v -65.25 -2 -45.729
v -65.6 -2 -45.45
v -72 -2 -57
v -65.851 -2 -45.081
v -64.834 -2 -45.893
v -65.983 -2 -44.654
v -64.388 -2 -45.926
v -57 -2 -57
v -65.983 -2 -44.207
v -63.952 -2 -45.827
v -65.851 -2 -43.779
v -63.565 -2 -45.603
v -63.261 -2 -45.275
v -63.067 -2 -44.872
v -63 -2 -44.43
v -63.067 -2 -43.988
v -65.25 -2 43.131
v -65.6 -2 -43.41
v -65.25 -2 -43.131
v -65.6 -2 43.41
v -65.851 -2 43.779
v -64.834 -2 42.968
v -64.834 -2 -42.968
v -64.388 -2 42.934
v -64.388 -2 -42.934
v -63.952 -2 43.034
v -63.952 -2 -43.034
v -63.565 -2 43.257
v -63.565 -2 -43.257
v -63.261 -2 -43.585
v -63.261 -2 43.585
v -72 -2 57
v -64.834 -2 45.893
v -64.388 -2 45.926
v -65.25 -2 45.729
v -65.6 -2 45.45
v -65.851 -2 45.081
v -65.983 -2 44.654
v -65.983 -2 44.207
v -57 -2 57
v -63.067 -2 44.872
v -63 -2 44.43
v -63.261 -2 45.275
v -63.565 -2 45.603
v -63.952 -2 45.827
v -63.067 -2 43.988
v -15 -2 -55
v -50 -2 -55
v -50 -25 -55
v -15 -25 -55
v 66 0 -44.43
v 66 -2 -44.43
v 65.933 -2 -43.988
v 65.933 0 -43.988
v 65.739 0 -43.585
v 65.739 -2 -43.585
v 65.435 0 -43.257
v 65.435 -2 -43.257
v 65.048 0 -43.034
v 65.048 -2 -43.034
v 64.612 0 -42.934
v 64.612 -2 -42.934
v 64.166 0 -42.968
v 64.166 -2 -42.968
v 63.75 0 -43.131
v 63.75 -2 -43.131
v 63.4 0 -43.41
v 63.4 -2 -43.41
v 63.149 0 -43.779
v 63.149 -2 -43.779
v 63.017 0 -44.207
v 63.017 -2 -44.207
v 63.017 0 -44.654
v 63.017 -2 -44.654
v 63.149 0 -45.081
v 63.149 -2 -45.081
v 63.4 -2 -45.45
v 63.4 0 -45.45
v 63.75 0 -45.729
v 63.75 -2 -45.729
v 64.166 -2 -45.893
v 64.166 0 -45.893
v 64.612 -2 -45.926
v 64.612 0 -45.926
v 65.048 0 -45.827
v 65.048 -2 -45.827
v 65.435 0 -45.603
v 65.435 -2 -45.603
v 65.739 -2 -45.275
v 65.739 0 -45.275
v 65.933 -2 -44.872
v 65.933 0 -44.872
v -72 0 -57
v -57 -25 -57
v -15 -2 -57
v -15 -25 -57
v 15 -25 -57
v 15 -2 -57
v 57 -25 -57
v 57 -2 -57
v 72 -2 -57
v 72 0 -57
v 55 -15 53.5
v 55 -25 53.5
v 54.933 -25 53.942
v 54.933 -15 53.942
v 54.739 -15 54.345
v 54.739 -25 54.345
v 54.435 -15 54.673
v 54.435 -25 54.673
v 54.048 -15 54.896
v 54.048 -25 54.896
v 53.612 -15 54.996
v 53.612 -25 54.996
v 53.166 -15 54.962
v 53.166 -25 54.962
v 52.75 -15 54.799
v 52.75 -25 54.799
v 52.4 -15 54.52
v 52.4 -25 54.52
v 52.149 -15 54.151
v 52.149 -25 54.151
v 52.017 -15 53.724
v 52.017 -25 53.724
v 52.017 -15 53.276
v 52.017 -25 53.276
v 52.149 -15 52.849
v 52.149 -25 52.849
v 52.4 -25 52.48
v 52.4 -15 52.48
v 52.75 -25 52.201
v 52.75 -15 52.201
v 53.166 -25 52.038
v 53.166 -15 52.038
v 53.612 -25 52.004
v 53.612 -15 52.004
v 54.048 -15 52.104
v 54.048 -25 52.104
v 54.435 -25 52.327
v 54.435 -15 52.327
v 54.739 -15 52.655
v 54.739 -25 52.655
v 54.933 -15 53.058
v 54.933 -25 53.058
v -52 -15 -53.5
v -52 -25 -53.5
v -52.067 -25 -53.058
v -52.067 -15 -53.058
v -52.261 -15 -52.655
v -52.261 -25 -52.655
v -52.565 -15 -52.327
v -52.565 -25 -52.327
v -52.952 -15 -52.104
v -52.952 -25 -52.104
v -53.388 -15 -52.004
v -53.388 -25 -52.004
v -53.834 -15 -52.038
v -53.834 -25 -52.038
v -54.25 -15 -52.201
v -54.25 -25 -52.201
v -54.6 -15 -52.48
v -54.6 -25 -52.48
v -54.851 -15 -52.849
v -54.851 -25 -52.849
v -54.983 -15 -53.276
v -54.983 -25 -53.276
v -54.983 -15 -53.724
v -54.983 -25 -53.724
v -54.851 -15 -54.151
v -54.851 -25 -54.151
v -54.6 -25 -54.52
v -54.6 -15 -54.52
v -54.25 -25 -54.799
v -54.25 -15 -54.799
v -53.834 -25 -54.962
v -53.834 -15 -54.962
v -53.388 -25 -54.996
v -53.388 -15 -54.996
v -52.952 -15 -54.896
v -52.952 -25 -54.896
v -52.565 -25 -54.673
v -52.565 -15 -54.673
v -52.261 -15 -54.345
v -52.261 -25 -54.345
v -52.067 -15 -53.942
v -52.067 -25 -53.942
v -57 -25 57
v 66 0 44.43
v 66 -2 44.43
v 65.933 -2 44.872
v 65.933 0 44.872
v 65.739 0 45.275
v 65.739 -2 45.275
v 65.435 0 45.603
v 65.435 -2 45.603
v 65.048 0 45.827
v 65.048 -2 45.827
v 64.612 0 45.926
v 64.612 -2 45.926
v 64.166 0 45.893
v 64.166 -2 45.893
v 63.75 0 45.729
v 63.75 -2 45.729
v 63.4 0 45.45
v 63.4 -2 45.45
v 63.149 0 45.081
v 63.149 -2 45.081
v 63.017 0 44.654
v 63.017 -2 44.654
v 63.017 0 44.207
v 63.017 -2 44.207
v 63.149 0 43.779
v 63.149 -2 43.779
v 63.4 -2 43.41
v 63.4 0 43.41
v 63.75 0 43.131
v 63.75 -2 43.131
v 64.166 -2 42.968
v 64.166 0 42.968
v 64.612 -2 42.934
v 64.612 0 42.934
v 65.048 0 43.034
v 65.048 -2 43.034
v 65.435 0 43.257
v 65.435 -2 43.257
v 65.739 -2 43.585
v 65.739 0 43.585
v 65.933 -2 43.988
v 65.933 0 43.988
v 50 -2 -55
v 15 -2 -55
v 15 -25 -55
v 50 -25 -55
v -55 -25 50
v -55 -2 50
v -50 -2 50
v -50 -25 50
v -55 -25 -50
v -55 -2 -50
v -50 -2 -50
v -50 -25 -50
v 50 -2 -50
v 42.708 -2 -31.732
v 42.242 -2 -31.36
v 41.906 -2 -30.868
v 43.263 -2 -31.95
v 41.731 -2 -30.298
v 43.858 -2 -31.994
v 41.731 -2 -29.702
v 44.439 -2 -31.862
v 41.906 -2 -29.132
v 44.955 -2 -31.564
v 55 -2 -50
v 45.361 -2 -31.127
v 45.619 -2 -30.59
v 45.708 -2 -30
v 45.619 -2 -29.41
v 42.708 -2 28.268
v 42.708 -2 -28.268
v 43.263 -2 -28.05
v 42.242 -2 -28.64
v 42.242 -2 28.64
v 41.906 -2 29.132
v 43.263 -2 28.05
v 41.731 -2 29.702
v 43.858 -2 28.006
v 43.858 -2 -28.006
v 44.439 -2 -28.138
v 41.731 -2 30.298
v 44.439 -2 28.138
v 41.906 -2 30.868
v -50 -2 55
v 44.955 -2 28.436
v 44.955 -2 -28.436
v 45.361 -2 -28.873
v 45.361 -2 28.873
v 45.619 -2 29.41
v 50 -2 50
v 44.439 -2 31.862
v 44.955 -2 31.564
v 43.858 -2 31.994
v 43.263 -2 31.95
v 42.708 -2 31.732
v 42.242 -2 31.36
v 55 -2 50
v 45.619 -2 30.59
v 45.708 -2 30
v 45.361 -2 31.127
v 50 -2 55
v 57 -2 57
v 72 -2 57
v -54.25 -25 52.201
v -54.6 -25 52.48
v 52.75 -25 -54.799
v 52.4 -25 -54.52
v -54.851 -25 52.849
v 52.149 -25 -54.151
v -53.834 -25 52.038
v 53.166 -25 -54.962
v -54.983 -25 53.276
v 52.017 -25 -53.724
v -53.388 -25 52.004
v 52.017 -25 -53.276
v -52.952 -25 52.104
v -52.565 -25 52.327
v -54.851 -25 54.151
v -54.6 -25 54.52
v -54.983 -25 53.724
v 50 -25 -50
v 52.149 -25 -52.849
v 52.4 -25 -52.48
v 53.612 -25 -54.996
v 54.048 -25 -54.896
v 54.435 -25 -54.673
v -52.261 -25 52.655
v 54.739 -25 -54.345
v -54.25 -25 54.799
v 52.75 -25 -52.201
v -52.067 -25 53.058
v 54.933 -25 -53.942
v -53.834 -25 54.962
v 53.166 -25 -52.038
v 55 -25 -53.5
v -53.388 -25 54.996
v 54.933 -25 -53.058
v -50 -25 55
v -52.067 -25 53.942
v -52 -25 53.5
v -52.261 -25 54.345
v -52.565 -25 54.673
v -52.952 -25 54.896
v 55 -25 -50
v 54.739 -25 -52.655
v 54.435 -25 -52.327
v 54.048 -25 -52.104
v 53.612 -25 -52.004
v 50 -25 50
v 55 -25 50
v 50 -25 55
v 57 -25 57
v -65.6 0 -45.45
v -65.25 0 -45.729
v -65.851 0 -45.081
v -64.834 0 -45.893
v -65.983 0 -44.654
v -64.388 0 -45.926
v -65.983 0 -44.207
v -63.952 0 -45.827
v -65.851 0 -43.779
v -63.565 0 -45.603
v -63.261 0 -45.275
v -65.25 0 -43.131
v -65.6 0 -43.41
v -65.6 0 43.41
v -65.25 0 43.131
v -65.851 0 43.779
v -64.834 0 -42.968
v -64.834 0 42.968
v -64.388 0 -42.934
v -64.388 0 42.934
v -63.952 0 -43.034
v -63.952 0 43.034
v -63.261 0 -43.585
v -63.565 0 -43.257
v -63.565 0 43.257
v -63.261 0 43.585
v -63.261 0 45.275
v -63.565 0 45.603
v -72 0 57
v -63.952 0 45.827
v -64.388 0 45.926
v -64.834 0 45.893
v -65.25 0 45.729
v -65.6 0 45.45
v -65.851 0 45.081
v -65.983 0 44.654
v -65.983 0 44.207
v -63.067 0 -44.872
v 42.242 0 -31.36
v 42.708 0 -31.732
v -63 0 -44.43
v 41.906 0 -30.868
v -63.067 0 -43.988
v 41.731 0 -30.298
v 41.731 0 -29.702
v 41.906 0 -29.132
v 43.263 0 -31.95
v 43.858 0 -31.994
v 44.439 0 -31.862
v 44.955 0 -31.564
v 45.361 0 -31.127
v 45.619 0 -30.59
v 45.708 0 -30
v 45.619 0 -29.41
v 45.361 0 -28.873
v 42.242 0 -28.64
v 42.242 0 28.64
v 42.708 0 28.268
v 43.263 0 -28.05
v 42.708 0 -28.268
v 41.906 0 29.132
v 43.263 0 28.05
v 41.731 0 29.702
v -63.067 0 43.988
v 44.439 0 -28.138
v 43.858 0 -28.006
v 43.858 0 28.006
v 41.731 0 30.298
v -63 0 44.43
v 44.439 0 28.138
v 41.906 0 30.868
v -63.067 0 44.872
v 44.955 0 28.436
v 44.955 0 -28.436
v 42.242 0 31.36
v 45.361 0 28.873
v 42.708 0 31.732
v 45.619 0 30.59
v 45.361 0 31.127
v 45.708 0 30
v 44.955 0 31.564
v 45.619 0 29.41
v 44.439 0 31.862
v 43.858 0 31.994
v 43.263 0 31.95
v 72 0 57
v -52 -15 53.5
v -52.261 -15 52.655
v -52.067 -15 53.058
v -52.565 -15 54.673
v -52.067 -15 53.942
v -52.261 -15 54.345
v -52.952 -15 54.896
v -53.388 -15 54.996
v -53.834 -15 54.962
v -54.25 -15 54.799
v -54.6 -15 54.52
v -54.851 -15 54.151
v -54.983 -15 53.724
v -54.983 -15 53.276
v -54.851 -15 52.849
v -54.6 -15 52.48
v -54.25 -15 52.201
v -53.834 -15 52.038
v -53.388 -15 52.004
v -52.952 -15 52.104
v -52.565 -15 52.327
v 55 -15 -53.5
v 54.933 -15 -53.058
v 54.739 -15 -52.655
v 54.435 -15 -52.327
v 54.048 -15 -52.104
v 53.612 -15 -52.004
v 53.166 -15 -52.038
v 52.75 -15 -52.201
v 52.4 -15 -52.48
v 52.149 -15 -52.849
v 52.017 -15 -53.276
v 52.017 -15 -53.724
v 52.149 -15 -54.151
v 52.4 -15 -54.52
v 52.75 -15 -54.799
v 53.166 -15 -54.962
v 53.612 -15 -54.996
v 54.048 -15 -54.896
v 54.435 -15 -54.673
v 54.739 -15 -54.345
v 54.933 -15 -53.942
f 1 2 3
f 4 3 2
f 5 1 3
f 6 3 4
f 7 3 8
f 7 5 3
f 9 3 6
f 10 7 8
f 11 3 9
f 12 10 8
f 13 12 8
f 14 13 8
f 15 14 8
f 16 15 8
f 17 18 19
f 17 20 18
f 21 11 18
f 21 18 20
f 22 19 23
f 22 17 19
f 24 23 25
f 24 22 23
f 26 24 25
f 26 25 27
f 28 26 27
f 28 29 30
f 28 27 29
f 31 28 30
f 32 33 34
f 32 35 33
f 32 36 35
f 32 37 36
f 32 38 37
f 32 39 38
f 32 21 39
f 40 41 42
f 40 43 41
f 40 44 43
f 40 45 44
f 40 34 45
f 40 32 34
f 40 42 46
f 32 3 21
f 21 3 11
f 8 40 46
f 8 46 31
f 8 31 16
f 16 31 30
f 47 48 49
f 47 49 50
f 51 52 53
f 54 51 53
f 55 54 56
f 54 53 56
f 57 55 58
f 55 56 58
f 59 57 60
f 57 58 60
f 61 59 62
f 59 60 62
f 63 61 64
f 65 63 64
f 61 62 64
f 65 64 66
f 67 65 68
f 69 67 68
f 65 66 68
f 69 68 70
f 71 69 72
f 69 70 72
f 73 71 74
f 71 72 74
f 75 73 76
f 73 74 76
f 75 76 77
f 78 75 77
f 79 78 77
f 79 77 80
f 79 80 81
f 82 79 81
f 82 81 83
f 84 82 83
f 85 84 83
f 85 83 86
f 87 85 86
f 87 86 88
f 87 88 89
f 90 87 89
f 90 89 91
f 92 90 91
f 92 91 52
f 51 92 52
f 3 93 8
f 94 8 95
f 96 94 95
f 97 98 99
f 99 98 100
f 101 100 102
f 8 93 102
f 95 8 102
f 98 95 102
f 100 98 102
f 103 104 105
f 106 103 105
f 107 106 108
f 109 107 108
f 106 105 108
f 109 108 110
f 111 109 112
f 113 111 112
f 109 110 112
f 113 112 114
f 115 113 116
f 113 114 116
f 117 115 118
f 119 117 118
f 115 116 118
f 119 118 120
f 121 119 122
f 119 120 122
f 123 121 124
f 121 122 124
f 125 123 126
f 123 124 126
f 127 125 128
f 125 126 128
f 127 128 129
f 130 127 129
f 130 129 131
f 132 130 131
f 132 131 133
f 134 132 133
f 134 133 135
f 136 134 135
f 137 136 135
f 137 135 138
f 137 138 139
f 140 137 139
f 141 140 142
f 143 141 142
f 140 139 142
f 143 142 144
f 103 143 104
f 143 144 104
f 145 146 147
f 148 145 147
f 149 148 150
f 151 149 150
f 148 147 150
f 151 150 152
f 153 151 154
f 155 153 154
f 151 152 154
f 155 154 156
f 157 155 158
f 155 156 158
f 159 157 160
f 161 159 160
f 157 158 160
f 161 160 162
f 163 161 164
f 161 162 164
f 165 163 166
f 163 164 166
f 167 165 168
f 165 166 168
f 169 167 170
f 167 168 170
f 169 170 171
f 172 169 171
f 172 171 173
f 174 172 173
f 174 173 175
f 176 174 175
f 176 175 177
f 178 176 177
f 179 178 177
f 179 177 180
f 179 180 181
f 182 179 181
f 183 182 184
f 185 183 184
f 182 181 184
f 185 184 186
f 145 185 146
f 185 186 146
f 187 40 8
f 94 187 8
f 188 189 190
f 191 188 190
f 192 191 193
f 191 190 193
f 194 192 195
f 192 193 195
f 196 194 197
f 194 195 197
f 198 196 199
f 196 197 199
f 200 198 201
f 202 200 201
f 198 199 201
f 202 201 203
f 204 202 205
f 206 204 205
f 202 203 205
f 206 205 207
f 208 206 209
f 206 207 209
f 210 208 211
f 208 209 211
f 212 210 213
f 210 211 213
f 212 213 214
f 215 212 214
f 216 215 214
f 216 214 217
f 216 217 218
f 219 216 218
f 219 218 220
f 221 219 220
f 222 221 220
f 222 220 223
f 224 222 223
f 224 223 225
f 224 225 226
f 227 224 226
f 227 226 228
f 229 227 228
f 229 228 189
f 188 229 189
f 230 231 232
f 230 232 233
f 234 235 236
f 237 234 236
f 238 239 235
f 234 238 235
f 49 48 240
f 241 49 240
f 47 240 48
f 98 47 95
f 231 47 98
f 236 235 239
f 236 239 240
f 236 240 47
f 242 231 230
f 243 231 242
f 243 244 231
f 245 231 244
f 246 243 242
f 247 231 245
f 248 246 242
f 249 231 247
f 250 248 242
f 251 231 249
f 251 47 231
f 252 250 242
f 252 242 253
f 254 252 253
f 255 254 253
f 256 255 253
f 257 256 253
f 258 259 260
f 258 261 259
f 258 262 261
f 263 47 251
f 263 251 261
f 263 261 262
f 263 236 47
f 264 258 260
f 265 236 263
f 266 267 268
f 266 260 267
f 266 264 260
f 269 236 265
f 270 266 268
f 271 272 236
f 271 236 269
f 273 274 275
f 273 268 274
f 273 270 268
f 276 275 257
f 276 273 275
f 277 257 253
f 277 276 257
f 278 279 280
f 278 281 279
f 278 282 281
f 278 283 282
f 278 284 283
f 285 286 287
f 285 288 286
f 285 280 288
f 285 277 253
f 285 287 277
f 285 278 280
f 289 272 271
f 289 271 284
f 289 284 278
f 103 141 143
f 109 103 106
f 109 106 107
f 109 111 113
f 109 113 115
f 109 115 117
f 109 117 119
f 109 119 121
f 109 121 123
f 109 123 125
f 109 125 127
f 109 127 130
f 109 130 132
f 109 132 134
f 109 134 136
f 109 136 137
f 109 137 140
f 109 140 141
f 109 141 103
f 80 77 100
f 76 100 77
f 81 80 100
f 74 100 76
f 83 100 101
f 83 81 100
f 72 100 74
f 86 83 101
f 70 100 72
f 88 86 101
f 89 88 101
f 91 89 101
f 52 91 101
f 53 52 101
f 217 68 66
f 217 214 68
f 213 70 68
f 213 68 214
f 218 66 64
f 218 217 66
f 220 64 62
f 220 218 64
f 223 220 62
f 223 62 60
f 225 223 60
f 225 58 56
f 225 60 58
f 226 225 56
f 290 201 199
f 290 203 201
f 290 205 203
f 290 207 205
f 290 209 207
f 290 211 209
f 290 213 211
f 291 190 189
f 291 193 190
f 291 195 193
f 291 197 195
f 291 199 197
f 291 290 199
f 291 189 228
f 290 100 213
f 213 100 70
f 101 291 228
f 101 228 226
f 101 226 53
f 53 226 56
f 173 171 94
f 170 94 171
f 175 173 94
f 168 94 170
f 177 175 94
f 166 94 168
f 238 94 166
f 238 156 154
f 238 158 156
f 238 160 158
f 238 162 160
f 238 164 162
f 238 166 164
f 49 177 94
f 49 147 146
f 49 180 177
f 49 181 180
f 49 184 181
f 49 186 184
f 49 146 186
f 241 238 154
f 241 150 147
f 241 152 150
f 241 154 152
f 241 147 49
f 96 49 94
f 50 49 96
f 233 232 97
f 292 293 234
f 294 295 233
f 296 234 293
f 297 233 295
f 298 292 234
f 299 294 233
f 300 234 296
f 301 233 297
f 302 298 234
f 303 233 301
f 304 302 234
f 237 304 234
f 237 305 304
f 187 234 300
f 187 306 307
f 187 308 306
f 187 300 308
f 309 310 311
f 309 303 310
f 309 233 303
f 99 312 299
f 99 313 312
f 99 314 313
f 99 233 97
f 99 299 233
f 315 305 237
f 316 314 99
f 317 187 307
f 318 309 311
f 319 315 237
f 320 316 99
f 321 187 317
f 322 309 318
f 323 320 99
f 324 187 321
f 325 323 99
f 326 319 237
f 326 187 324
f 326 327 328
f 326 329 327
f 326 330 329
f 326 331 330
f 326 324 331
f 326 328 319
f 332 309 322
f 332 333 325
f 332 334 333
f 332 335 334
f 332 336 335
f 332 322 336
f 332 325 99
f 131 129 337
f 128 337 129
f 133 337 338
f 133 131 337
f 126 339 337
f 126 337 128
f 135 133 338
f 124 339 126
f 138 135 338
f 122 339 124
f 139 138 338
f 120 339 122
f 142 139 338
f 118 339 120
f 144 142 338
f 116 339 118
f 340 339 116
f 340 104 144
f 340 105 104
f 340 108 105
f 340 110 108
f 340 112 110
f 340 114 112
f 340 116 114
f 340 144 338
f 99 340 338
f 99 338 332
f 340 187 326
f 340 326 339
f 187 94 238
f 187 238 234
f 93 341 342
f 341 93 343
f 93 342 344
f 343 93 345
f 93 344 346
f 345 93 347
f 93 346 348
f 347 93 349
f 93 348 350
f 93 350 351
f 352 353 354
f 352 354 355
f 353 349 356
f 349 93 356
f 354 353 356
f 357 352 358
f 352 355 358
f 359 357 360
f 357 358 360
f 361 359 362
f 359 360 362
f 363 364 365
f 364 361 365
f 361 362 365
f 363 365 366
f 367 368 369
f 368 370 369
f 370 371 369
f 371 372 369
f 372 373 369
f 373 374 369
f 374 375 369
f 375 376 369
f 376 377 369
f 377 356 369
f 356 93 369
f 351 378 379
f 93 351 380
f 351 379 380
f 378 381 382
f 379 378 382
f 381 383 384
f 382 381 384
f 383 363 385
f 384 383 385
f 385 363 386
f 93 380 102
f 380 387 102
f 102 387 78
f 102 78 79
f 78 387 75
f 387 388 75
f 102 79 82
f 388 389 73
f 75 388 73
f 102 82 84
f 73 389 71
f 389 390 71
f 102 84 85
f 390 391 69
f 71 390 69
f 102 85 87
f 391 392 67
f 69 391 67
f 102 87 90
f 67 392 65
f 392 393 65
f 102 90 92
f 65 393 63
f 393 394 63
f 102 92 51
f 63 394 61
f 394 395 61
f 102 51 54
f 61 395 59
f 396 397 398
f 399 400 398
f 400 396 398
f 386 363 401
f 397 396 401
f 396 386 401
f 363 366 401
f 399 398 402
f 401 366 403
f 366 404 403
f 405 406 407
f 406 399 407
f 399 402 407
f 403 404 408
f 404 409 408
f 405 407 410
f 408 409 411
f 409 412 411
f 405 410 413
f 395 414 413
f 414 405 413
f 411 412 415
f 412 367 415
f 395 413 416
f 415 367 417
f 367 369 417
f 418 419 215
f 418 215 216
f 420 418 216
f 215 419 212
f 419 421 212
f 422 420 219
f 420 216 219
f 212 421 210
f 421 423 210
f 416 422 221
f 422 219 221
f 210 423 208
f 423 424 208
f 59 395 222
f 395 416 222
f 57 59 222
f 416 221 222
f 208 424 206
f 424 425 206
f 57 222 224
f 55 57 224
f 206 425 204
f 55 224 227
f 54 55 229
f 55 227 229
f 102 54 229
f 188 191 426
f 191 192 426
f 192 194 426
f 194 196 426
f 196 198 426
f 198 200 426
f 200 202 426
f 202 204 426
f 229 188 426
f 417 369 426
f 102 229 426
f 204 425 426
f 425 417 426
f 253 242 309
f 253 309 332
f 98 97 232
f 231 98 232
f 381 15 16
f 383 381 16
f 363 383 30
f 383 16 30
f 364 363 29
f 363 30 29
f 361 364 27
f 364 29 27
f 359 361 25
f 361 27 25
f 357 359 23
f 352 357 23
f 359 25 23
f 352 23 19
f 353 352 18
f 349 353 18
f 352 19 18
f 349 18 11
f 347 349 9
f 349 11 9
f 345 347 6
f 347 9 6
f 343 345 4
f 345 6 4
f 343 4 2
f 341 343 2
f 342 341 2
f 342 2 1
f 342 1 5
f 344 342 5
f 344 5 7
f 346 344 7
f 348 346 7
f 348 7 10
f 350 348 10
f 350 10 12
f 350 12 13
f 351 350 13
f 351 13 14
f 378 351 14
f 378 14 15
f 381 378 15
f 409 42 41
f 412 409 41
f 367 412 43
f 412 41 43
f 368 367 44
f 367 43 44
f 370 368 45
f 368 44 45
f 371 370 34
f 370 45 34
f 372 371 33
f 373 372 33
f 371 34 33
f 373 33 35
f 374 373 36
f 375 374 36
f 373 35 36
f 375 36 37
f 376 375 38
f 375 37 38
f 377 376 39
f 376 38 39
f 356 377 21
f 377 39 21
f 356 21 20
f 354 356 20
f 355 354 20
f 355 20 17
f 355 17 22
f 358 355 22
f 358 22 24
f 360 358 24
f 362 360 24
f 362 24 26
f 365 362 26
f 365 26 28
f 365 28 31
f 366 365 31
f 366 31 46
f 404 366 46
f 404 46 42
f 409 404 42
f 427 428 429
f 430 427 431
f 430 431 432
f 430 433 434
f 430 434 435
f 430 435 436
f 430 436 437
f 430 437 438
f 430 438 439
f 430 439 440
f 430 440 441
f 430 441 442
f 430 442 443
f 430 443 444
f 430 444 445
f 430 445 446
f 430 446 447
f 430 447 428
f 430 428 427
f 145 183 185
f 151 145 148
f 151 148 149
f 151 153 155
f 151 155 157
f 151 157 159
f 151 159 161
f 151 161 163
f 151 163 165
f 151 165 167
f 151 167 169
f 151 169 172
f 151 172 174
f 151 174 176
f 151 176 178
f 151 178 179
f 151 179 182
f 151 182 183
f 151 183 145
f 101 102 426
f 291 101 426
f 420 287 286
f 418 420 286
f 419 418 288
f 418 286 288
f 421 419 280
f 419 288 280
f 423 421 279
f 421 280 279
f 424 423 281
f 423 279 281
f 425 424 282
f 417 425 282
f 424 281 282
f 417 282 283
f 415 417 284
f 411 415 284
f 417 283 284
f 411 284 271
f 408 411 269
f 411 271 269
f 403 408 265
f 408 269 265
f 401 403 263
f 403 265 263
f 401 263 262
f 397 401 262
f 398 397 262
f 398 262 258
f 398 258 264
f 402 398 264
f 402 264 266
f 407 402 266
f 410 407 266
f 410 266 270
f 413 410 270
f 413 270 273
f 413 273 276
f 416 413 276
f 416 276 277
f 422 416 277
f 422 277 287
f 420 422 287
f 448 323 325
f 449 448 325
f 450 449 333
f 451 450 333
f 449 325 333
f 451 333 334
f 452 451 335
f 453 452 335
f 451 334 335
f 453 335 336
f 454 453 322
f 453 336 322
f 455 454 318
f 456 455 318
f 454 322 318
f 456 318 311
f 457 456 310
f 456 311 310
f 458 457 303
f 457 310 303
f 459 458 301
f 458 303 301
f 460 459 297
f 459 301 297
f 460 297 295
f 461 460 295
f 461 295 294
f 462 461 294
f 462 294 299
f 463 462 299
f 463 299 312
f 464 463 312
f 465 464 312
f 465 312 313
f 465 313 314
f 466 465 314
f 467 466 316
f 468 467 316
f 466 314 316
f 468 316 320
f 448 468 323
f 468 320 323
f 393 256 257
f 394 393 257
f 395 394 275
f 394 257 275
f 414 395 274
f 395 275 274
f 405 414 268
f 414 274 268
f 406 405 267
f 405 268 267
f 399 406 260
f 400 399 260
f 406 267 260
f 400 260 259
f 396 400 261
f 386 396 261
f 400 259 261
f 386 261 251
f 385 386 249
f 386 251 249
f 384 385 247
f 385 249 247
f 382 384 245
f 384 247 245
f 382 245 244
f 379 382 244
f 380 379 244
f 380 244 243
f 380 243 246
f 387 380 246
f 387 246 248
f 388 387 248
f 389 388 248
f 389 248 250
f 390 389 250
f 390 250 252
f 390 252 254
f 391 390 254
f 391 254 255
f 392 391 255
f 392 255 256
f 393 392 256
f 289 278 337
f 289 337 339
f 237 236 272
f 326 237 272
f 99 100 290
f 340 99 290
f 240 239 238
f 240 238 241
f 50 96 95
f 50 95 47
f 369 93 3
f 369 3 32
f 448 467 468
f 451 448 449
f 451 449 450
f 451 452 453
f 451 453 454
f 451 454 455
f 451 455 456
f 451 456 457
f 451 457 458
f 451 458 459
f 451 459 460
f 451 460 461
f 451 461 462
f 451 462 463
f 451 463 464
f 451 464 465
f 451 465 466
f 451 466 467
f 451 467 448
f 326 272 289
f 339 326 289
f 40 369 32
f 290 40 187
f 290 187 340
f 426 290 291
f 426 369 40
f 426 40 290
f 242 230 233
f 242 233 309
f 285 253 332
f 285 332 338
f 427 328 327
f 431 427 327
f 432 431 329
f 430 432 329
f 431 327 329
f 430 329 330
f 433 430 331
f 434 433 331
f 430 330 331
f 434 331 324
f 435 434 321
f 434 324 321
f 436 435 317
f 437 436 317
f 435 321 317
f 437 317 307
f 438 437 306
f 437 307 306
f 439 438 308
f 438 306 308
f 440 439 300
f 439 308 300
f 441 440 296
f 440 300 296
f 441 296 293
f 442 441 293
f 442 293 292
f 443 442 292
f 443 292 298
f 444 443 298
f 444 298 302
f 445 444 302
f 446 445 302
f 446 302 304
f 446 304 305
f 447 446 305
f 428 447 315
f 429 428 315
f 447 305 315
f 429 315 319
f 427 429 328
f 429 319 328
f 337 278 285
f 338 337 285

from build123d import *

# Parameters (mm, degrees)
F0_W      = 110
F0_H      = 110
F1_DEPTH  = 2
F2_W      = 110
F2_H      = 110
F3_DEPTH  = 25
F4_W      = 5
F4_H      = 5
F5_DEPTH  = 23
F6_R      = 1.5
F7_DEPTH  = 10
F8_W      = 15
F8_H      = 114
F9_DEPTH  = 2
F10_R     = 1.5
F11_DEPTH = 2.001
F12_W     = 30
F12_H     = 2
F13_DEPTH = 23
F14_R     = 2
F15_DEPTH = 2.001


with BuildPart() as f1:
    # F0 (on Front) → F1 (new body)
    with BuildSketch(Plane.XZ):
        Rectangle(F0_W, F0_H)
    extrude(amount=F1_DEPTH)

    # F2 (on Front) → F3 (join)
    with BuildSketch(Plane.XZ):
        Polygon((57, 57), (55, 57), (-55, 57), (-57, 57), (-57, 55), (-57, -55), (-57, -57), (-55, -57), (55, -57), (57, -57), (57, -55), (57, 55), align=None)
        Rectangle(F2_W, F2_H, mode=Mode.SUBTRACT)
    extrude(amount=F3_DEPTH)

    # F4 (on face) → F5 (join)
    with BuildSketch(Plane.XZ.offset(2)):
        with Locations((-52.5, 52.5)):
            Rectangle(F4_W, F4_H)
        with Locations((52.5, 52.5)):
            Rectangle(F4_W, F4_H)
        with Locations((-52.5, -52.5)):
            Rectangle(F4_W, F4_H)
        with Locations((52.5, -52.5)):
            Rectangle(F4_W, F4_H)
    extrude(amount=F5_DEPTH)

    # F6 (on face) → F7 (cut)
    with BuildSketch(Plane.XZ.offset(25)):
        with Locations((-53.5, 53.5)):
            Circle(F6_R)
        with Locations((53.5, 53.5)):
            Circle(F6_R)
        with Locations((-53.5, -53.5)):
            Circle(F6_R)
        with Locations((53.5, -53.5)):
            Circle(F6_R)
    extrude(amount=-F7_DEPTH, mode=Mode.SUBTRACT)

    # F8 (on Front) → F9 (join)
    with BuildSketch(Plane.XZ):
        with Locations((-64.5, 0)):
            Rectangle(F8_W, F8_H)
        with Locations((64.5, 0)):
            Rectangle(F8_W, F8_H)
    extrude(amount=F9_DEPTH)

    # F10 (on face) → F11 (cut, through all)
    with BuildSketch(Plane.XZ.offset(2)):
        with Locations((-64.5, 44.430215)):
            Circle(F10_R)
        with Locations((64.5, 44.430215)):
            Circle(F10_R)
        with Locations((-64.5, -44.430215)):
            Circle(F10_R)
        with Locations((64.5, -44.430215)):
            Circle(F10_R)
    extrude(amount=-F11_DEPTH, mode=Mode.SUBTRACT)

    # F12 (on face) → F13 (cut)
    with BuildSketch(Plane.XZ.offset(25)):
        with Locations((0, -56)):
            Rectangle(F12_W, F12_H)
    extrude(amount=-F13_DEPTH, mode=Mode.SUBTRACT)

    # F14 (on face) → F15 (cut, through all)
    with BuildSketch(Plane.XZ.offset(2)):
        with Locations((43.708343, 30)):
            Circle(F14_R)
        with Locations((43.708343, -30)):
            Circle(F14_R)
    extrude(amount=-F15_DEPTH, mode=Mode.SUBTRACT)


solid = f1.part
